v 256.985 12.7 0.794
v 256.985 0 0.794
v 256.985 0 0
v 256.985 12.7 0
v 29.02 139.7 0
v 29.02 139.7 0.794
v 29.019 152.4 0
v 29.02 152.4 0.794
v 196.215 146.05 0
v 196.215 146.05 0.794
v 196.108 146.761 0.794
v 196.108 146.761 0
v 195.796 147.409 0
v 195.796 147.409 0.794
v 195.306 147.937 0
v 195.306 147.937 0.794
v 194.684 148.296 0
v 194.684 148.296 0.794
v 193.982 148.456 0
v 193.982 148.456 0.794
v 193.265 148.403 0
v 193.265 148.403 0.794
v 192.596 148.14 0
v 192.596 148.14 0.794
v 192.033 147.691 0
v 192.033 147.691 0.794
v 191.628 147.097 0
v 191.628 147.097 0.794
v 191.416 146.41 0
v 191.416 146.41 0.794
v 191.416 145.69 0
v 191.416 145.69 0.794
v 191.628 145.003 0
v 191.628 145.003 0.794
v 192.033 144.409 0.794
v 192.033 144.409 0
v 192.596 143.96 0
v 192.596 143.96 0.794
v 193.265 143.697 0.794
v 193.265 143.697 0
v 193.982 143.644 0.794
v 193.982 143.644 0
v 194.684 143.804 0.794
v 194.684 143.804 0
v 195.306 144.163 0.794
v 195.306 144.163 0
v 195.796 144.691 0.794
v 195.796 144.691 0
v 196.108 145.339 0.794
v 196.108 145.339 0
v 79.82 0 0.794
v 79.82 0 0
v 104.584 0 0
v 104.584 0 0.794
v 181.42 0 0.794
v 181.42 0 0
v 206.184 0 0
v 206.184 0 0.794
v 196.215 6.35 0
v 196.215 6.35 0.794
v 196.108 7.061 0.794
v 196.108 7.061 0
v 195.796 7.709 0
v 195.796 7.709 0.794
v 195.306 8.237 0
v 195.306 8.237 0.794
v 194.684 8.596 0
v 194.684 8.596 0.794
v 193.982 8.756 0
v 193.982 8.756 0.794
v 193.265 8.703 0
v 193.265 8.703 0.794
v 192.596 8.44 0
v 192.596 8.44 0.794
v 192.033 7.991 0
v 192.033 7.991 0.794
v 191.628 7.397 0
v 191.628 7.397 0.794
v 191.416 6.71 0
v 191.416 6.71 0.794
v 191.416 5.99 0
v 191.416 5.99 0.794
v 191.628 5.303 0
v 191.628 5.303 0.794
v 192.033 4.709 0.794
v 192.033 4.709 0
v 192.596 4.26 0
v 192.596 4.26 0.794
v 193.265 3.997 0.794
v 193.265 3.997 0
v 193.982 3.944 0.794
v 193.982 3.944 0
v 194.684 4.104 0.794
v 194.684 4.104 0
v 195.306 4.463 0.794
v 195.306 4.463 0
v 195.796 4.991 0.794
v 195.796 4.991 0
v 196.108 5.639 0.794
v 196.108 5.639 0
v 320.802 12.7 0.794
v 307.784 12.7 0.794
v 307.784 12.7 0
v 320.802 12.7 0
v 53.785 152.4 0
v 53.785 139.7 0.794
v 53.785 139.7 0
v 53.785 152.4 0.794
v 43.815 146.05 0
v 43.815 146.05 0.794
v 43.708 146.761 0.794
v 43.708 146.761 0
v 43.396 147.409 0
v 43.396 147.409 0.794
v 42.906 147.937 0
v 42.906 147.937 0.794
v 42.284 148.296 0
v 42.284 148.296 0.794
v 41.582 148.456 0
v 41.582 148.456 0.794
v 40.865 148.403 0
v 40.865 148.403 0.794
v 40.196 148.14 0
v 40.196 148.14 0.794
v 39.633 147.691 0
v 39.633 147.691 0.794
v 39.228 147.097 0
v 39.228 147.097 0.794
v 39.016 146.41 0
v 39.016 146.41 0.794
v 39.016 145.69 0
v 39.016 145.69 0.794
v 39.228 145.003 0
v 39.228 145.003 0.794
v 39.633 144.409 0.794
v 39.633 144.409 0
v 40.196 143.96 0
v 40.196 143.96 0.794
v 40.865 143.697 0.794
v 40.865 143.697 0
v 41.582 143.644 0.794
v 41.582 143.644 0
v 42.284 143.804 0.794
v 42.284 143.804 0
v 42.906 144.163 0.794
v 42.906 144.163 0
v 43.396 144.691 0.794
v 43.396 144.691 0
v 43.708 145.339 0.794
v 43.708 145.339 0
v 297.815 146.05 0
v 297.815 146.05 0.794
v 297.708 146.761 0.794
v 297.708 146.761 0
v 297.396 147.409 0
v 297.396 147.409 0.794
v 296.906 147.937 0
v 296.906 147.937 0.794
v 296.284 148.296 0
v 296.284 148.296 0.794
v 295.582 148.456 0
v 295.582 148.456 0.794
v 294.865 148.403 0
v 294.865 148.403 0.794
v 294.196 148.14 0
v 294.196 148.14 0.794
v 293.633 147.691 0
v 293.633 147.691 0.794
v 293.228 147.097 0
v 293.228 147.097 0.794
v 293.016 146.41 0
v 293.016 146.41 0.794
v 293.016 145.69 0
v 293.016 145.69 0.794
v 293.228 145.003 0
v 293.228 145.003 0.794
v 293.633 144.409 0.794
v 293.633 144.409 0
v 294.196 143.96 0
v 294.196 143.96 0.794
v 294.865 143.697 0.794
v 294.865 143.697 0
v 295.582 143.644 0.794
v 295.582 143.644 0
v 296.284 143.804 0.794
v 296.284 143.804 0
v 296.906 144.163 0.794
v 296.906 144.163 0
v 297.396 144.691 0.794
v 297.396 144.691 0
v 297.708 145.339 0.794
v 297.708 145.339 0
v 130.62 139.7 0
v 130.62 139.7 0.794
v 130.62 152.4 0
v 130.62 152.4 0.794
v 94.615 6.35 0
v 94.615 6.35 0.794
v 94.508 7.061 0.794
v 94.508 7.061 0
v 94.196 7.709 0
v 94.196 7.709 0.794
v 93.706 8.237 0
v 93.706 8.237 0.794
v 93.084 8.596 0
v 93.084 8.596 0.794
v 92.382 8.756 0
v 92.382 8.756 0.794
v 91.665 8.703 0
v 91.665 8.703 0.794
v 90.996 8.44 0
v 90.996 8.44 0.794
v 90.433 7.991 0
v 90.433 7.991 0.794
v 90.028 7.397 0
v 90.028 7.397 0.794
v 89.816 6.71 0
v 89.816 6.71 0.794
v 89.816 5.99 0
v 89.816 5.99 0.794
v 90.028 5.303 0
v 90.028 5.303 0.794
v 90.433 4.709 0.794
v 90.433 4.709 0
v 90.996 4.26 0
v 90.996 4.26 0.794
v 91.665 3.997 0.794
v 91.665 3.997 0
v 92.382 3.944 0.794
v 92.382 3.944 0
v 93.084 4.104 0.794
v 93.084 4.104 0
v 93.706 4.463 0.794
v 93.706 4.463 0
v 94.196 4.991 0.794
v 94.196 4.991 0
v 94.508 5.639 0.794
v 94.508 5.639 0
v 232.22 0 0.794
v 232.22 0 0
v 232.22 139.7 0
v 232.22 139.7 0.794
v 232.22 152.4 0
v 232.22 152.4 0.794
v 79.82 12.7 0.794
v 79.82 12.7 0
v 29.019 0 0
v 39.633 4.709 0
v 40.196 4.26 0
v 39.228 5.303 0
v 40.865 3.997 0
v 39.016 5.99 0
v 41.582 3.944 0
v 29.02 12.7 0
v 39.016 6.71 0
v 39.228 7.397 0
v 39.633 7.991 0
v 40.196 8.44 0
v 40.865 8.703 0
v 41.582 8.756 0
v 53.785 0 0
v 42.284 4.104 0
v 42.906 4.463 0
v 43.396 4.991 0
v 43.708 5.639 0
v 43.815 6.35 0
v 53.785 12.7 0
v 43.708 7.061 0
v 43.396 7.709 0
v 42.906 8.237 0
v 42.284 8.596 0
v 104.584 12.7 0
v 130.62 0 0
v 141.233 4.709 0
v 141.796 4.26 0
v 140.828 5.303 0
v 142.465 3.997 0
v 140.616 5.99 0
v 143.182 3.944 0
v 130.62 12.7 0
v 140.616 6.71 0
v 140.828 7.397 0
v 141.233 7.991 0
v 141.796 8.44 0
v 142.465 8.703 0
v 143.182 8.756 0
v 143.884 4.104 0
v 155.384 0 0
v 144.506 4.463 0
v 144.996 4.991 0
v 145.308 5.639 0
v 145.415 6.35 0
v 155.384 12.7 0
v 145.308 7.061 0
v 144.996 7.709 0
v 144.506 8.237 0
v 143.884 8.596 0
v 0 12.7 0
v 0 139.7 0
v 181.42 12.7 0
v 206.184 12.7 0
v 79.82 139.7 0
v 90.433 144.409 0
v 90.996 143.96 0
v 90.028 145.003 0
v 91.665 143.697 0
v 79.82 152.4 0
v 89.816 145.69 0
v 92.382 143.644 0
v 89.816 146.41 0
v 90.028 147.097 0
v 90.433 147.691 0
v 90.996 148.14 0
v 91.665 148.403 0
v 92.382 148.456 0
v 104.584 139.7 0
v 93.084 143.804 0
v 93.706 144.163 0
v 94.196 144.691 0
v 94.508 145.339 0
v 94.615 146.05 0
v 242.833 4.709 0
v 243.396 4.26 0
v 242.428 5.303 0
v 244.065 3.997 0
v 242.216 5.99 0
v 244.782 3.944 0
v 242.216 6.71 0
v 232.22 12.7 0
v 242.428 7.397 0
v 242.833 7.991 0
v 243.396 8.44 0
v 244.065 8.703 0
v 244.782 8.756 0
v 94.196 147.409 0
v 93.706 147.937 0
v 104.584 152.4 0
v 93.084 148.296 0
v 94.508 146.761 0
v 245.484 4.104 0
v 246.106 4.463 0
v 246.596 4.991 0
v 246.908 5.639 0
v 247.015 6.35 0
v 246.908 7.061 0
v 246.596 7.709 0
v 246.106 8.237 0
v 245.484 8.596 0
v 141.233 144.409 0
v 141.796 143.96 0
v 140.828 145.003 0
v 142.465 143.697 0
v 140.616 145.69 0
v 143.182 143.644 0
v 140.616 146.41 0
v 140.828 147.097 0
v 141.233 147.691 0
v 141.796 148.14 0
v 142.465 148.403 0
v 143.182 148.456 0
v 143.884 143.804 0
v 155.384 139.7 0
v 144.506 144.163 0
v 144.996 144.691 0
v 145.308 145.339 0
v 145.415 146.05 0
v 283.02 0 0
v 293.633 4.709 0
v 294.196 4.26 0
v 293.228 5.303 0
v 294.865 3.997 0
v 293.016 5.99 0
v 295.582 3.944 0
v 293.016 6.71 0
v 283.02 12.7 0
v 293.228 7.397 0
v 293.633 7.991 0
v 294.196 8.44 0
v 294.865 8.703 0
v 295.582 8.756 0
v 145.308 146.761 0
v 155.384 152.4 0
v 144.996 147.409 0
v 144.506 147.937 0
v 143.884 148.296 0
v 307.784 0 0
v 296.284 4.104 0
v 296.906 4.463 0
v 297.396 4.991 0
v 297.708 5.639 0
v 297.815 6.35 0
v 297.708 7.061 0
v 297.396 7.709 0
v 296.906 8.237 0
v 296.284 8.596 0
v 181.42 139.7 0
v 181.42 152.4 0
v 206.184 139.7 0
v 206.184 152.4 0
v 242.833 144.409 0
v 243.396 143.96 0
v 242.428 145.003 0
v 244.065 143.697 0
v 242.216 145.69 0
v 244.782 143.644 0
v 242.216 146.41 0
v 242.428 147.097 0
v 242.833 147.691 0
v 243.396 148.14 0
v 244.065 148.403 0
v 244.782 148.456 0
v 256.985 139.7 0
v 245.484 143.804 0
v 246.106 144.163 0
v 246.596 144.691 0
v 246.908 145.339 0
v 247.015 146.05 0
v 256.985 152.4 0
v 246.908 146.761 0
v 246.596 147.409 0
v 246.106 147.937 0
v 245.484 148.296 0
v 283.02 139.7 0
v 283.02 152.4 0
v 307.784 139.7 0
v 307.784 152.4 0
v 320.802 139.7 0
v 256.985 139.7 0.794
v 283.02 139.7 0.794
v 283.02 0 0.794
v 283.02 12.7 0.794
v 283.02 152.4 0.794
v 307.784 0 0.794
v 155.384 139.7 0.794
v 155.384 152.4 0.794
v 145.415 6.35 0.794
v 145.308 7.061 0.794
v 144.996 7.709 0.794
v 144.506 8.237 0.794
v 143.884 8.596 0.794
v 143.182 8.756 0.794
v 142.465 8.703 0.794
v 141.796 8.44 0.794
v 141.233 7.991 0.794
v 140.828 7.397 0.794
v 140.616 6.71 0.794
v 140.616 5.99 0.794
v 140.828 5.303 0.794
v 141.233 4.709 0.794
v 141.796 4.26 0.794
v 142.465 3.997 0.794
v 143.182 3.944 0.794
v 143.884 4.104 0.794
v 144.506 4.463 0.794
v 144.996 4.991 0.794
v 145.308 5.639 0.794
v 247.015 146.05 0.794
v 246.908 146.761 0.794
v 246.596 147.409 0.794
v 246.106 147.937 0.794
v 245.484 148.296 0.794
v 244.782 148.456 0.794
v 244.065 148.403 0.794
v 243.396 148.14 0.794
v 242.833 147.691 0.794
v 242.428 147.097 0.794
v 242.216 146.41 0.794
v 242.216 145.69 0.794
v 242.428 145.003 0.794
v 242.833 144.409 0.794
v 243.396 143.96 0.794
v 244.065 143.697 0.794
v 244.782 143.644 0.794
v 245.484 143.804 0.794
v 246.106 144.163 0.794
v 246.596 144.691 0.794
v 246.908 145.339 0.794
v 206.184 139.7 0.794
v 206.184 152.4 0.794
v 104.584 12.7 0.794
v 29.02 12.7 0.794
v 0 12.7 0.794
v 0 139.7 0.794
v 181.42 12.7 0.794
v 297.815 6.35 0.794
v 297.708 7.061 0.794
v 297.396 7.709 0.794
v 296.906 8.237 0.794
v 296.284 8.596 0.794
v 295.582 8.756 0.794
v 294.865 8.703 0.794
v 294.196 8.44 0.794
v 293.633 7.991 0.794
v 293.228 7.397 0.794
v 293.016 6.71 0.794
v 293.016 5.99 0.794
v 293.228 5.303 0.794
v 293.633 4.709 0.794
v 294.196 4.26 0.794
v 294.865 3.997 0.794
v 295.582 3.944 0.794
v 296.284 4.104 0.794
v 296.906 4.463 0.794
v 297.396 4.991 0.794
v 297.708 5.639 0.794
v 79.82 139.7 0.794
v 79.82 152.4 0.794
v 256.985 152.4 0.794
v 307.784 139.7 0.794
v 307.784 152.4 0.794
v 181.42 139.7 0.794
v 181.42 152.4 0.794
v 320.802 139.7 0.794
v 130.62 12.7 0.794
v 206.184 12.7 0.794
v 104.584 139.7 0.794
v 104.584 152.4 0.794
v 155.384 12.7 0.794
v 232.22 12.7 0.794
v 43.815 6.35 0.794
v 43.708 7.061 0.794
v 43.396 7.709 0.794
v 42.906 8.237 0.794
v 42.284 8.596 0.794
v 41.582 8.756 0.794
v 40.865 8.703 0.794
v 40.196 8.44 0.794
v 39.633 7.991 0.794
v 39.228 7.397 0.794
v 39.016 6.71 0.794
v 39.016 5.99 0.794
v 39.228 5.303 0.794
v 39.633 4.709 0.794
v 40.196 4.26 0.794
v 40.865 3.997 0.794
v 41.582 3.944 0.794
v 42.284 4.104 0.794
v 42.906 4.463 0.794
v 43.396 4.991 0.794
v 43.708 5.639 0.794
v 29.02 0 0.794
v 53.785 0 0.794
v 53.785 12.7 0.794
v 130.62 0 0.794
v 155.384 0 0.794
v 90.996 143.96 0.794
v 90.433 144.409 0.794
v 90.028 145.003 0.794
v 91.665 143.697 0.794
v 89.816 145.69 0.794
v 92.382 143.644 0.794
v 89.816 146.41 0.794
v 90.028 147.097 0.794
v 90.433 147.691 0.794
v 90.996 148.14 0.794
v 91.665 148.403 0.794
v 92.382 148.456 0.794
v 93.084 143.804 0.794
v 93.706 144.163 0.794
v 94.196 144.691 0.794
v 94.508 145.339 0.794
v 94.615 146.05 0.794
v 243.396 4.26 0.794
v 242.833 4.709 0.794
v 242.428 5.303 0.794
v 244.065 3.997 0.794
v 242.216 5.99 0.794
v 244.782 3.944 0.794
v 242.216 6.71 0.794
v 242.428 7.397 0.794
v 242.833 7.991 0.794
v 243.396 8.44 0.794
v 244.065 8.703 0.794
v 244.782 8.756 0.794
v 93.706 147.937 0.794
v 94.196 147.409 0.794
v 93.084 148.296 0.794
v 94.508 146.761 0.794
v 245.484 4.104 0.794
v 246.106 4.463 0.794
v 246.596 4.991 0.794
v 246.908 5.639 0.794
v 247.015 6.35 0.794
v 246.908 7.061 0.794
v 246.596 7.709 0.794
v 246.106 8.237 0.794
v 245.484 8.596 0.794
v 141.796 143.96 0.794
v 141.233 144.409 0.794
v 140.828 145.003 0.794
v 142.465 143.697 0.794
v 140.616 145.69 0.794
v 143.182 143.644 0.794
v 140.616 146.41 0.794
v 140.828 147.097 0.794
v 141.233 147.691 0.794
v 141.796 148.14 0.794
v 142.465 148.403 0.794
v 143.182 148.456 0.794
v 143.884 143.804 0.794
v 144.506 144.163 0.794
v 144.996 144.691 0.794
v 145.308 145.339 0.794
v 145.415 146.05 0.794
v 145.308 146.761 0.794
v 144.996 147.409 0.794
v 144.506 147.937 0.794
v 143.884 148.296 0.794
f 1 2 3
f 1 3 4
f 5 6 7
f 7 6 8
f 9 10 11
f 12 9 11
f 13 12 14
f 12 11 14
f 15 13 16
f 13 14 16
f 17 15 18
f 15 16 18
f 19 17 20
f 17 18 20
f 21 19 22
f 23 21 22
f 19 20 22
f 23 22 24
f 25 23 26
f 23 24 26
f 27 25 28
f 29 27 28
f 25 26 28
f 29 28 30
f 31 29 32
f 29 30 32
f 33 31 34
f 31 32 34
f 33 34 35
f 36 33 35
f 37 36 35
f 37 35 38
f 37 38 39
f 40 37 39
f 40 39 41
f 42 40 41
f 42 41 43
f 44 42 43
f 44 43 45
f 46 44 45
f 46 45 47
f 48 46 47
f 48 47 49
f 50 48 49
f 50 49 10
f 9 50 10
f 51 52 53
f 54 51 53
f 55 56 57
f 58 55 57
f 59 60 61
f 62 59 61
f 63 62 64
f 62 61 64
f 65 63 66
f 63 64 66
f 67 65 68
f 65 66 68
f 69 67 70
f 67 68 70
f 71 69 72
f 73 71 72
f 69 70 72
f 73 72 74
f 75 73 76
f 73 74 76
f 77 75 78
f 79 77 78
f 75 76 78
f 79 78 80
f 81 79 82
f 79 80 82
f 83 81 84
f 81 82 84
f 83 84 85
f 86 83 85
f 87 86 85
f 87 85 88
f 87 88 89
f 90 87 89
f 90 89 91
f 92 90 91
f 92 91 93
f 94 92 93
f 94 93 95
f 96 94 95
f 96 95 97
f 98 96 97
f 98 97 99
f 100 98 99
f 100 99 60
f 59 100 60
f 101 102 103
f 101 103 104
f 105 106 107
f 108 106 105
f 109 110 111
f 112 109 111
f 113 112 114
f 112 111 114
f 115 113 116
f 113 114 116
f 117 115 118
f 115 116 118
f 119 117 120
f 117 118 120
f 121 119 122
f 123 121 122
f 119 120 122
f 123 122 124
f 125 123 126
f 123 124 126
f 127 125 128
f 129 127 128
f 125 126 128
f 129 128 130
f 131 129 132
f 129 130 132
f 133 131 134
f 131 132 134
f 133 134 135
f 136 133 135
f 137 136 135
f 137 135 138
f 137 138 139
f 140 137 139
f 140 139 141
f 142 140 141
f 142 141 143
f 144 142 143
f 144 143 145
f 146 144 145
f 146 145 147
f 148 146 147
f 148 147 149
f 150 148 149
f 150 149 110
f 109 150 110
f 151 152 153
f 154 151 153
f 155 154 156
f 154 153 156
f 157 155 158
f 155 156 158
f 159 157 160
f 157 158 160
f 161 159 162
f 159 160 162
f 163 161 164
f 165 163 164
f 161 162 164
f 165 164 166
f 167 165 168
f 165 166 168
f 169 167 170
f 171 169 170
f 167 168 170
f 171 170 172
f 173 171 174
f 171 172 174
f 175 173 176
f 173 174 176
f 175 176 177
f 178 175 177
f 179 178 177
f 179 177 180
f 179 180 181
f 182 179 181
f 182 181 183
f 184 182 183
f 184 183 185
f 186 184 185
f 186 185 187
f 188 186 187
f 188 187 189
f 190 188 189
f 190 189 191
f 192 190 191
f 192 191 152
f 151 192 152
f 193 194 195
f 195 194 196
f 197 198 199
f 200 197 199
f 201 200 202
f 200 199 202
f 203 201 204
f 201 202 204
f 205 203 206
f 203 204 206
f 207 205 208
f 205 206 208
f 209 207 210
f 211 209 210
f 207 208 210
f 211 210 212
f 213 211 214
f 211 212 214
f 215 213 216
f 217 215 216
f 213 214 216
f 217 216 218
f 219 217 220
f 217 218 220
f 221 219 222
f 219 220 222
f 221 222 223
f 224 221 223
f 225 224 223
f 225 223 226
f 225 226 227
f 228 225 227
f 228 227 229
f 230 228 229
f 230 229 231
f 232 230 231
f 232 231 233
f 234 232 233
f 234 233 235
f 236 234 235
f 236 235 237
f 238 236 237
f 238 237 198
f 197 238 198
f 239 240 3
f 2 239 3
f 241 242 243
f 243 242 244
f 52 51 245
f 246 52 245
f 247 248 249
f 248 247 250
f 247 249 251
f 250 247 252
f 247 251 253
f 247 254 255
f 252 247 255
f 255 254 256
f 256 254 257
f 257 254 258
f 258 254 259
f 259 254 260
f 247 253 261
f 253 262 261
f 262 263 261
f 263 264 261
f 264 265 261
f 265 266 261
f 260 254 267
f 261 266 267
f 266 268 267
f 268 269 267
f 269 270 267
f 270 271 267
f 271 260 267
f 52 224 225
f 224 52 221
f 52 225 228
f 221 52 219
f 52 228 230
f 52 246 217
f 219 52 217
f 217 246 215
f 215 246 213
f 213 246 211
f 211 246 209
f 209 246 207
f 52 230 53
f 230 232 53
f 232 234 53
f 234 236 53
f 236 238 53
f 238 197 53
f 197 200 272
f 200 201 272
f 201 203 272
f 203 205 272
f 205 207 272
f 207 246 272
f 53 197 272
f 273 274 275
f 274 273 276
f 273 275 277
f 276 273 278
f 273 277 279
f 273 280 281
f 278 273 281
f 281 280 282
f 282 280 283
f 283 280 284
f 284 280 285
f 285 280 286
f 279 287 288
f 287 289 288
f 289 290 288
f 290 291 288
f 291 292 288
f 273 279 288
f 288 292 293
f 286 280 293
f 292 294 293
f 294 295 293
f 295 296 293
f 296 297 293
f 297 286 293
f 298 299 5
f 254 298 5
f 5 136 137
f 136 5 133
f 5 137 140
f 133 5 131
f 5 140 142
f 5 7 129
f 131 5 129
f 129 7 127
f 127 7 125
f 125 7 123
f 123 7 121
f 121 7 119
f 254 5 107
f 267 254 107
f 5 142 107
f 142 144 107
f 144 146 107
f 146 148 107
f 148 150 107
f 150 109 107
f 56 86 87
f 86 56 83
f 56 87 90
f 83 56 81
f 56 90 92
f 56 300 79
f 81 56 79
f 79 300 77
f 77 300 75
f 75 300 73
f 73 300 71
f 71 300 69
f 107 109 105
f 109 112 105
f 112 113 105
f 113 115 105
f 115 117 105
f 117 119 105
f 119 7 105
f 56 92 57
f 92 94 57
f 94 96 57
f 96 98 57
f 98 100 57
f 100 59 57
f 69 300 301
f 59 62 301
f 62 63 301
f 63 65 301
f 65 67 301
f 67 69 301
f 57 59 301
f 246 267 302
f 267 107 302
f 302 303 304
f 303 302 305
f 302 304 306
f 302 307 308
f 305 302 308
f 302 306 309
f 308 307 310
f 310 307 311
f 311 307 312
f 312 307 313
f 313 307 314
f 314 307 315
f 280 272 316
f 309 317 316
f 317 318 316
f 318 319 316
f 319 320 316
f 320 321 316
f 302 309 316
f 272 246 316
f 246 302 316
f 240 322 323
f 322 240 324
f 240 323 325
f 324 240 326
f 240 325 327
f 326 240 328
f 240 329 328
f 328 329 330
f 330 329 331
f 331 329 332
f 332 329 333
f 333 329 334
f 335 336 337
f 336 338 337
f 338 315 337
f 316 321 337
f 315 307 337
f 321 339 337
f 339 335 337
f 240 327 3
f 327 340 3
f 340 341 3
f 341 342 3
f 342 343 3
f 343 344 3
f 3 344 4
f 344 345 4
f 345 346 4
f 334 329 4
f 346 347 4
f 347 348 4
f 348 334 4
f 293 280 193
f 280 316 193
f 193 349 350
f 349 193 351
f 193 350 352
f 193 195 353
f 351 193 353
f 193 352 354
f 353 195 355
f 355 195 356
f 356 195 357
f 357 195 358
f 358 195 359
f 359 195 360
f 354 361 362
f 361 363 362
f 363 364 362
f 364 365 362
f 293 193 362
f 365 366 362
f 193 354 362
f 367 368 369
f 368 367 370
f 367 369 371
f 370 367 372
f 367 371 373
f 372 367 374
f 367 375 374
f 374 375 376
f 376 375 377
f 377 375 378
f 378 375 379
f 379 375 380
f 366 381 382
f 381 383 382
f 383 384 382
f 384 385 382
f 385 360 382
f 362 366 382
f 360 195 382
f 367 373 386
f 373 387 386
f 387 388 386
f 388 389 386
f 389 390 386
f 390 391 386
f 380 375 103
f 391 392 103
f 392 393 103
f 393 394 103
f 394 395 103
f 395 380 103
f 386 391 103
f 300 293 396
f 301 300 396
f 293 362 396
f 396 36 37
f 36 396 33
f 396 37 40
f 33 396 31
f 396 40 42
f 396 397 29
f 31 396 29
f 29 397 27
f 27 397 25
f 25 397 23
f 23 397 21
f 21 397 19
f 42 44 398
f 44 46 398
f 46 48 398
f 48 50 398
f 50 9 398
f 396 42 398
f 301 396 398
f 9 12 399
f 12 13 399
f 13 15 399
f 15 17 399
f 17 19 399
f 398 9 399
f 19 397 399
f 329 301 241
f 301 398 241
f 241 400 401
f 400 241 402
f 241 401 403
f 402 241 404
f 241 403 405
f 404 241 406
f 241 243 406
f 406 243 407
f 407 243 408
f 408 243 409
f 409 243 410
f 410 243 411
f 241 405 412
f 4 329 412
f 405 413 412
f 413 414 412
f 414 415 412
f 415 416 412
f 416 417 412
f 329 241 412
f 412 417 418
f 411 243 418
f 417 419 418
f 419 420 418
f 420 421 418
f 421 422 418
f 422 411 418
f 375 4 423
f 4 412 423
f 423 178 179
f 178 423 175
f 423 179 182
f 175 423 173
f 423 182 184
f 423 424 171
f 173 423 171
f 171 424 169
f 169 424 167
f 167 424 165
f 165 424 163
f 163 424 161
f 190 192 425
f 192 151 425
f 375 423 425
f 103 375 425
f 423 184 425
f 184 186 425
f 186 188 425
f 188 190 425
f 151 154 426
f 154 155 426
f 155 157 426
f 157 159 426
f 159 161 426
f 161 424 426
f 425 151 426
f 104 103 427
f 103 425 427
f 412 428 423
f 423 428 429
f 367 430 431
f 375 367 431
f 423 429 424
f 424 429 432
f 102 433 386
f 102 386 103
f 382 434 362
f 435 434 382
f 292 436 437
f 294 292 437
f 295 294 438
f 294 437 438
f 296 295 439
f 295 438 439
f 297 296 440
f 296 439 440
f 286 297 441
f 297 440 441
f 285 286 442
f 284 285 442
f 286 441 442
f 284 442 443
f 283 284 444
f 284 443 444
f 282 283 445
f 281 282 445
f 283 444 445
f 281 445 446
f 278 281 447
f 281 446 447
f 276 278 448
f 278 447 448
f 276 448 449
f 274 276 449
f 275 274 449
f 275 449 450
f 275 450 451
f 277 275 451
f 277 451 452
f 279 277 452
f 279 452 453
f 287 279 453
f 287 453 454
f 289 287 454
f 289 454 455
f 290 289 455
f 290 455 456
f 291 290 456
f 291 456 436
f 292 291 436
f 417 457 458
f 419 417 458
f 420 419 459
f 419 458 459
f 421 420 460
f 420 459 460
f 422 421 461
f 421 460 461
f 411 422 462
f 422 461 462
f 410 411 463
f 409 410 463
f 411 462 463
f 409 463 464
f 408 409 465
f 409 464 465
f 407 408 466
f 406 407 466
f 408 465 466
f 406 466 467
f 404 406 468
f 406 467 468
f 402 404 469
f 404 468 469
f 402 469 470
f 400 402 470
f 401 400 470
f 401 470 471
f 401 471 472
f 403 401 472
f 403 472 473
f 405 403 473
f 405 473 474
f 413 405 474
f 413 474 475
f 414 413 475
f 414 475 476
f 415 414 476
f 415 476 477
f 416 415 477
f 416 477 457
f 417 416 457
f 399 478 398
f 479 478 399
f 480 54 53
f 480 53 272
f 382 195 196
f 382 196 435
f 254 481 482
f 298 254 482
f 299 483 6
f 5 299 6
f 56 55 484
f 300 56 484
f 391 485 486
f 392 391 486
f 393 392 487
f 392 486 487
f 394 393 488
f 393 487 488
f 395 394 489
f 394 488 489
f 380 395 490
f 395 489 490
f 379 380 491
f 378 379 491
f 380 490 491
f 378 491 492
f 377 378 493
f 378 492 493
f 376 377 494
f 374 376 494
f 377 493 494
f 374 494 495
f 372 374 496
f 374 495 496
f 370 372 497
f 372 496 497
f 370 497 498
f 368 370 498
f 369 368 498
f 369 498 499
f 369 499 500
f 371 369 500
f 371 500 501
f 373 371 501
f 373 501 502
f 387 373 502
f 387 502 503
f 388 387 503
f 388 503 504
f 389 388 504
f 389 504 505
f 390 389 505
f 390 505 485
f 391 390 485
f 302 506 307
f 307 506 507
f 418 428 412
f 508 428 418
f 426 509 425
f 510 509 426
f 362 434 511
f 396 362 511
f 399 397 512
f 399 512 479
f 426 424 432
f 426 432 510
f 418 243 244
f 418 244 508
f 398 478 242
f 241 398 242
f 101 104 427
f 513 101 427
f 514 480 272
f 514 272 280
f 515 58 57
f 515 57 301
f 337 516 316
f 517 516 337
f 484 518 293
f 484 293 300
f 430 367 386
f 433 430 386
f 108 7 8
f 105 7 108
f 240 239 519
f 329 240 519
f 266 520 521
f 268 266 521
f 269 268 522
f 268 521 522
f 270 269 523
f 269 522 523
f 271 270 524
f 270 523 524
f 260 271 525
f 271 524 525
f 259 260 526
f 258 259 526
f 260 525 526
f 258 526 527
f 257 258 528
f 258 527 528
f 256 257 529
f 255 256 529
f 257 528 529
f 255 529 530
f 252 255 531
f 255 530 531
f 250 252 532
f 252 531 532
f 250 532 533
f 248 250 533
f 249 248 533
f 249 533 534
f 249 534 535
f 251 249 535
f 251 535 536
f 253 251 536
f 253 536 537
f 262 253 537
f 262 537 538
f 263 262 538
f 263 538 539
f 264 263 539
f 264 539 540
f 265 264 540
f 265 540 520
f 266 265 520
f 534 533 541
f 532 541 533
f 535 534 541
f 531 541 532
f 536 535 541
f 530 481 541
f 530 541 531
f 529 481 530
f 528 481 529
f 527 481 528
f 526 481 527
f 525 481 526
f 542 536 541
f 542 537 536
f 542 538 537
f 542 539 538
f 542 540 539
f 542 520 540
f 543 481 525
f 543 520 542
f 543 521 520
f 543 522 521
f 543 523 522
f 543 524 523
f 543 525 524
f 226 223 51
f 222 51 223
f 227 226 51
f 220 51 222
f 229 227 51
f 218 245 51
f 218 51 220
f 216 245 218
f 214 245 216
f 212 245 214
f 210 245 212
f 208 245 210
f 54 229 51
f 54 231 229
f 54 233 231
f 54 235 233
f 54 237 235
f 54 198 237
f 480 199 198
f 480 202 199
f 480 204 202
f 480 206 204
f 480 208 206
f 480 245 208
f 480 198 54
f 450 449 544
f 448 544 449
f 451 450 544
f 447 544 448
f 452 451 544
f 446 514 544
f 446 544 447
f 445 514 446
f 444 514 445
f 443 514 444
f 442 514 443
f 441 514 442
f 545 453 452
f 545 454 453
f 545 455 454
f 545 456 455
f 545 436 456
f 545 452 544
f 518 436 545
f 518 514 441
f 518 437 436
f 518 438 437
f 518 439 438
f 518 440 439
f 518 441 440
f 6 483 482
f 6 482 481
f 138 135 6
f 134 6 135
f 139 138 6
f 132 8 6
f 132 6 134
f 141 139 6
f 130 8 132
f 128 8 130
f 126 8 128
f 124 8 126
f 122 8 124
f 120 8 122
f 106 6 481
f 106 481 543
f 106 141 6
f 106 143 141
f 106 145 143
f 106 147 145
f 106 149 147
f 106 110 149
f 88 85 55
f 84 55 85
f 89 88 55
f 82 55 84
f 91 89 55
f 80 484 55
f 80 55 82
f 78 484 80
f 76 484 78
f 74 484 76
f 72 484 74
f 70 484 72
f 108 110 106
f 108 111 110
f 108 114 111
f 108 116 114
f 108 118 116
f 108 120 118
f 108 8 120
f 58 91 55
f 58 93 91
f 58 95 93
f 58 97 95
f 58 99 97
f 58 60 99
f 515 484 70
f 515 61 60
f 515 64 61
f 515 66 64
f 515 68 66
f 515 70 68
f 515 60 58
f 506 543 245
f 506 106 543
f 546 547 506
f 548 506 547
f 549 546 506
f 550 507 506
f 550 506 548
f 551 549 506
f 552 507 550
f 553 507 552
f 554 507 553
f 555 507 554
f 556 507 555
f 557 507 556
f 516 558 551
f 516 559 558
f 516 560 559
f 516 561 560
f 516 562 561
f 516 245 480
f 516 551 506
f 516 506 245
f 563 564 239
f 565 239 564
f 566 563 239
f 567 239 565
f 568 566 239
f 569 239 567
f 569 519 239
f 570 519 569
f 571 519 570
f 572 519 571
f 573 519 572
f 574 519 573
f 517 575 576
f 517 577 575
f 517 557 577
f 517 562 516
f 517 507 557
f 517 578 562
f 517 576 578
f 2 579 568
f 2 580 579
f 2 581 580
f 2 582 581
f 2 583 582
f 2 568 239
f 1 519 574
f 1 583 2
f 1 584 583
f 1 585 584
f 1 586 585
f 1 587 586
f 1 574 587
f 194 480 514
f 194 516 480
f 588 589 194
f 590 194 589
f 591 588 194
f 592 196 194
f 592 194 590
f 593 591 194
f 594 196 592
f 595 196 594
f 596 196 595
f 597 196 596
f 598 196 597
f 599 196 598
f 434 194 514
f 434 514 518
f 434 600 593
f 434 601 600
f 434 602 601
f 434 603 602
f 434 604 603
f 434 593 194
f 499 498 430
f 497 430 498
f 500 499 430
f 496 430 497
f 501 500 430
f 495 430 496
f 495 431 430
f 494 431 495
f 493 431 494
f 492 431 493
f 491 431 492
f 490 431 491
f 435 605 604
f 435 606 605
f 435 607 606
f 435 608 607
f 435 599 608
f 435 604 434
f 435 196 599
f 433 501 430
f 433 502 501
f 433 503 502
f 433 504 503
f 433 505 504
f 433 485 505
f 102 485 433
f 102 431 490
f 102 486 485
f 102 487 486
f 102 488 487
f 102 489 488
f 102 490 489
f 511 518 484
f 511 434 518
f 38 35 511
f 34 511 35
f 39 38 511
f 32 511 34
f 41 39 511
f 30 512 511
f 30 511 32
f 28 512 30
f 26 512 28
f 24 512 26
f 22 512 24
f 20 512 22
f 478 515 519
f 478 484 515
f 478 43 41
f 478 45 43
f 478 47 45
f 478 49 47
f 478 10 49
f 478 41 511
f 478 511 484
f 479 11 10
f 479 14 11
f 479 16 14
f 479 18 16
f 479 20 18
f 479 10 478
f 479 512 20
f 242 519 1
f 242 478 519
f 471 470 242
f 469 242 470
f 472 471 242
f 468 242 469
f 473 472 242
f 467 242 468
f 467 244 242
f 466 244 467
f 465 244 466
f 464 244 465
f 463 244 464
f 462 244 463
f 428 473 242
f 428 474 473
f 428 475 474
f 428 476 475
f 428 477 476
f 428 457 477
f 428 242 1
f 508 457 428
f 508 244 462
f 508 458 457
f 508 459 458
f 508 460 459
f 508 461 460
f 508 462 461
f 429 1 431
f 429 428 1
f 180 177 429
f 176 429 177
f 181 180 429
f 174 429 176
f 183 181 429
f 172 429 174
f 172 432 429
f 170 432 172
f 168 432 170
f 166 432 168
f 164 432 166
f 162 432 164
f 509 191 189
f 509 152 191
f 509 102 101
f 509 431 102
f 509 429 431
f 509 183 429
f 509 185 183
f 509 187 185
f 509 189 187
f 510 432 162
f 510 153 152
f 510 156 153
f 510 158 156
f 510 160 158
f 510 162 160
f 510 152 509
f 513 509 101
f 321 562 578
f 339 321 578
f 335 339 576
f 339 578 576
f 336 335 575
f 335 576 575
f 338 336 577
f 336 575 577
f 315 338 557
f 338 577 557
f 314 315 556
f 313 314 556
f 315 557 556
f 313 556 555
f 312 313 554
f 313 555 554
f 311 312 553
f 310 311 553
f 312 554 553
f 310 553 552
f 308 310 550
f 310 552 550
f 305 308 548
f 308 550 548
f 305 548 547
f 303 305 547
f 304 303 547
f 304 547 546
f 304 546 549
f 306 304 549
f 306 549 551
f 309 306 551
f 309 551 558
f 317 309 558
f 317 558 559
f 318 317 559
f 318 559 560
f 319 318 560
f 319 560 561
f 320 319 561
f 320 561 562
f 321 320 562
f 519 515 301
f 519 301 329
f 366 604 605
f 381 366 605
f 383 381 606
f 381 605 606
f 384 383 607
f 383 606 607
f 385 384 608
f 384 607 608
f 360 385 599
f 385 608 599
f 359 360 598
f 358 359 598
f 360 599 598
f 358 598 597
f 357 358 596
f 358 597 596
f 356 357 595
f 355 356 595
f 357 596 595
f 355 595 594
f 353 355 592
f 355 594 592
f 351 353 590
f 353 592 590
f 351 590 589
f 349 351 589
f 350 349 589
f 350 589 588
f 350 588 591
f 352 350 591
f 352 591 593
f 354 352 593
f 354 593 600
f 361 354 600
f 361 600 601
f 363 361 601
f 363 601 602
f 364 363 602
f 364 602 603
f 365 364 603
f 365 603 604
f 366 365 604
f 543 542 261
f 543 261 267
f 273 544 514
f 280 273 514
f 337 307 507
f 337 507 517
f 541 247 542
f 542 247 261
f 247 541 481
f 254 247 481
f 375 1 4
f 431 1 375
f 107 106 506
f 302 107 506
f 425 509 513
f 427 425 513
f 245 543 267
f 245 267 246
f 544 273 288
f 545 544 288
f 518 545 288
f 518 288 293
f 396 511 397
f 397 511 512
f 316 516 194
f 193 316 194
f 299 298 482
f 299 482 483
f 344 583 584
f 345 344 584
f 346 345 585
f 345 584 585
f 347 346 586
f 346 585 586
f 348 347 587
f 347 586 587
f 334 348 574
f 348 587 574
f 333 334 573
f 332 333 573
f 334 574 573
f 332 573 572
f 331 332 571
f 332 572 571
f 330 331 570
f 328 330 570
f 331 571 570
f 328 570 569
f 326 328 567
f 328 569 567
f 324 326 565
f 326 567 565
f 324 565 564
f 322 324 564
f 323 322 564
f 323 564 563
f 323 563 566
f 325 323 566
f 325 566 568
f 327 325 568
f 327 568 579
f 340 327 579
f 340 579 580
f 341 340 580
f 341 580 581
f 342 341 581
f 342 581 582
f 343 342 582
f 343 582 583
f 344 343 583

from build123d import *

# Parameters (mm, degrees)
SKETCH1_W           = 320.802
SKETCH1_H           = 152.4
BOSS_EXTRUDE1_DEPTH = 0.79375
SKETCH2_W           = 13.0175
SKETCH2_H           = 12.7
SKETCH2_W_2         = 26.035
SKETCH2_W_3         = 2.9845
CUT_EXTRUDE1_DEPTH  = 1.79375
SKETCH3_R           = 2.413
CUT_EXTRUDE2_DEPTH  = 1.79375


with BuildPart() as part:
    # Sketch1 → Boss-Extrude1 (new body)
    with BuildSketch(Plane.XY):
        with Locations((160.401, 76.2)):
            Rectangle(SKETCH1_W, SKETCH1_H)
    extrude(amount=BOSS_EXTRUDE1_DEPTH)

    # Sketch2 → Cut-Extrude1 (cut, through all)
    with BuildSketch(Plane.XY.offset(0.79375)):
        with Locations((314.29325, 146.05)):
            Rectangle(SKETCH2_W, SKETCH2_H)
        with Locations((270.002, 146.05)):
            Rectangle(SKETCH2_W_2, SKETCH2_H)
        with Locations((219.202, 146.05)):
            Rectangle(SKETCH2_W_2, SKETCH2_H)
        with Locations((168.402, 146.05)):
            Rectangle(SKETCH2_W_2, SKETCH2_H)
        with Locations((117.602, 146.05)):
            Rectangle(SKETCH2_W_2, SKETCH2_H)
        with Locations((66.802, 146.05)):
            Rectangle(SKETCH2_W_2, SKETCH2_H)
        with Locations((16.002, 146.05)):
            Rectangle(SKETCH2_W_2, SKETCH2_H)
        with Locations((1.49225, 146.05)):
            Rectangle(SKETCH2_W_3, SKETCH2_H)
        with Locations((1.49225, 6.35)):
            Rectangle(SKETCH2_W_3, SKETCH2_H)
        with Locations((16.002, 6.35)):
            Rectangle(SKETCH2_W_2, SKETCH2_H)
        with Locations((66.802, 6.35)):
            Rectangle(SKETCH2_W_2, SKETCH2_H)
        with Locations((117.602, 6.35)):
            Rectangle(SKETCH2_W_2, SKETCH2_H)
        with Locations((168.402, 6.35)):
            Rectangle(SKETCH2_W_2, SKETCH2_H)
        with Locations((219.202, 6.35)):
            Rectangle(SKETCH2_W_2, SKETCH2_H)
        with Locations((270.002, 6.35)):
            Rectangle(SKETCH2_W_2, SKETCH2_H)
        with Locations((314.29325, 6.35)):
            Rectangle(SKETCH2_W, SKETCH2_H)
    extrude(amount=-CUT_EXTRUDE1_DEPTH, mode=Mode.SUBTRACT)

    # Sketch3 → Cut-Extrude2 (cut, through all)
    with BuildSketch(Plane.XY.offset(0.79375)):
        with Locations((41.402, 146.05)):
            Circle(SKETCH3_R)
        with Locations((92.202, 146.05)):
            Circle(SKETCH3_R)
        with Locations((143.002, 146.05)):
            Circle(SKETCH3_R)
        with Locations((193.802, 146.05)):
            Circle(SKETCH3_R)
        with Locations((244.602, 146.05)):
            Circle(SKETCH3_R)
        with Locations((295.402, 146.05)):
            Circle(SKETCH3_R)
        with Locations((92.202, 6.35)):
            Circle(SKETCH3_R)
        with Locations((143.002, 6.35)):
            Circle(SKETCH3_R)
        with Locations((193.802, 6.35)):
            Circle(SKETCH3_R)
        with Locations((244.602, 6.35)):
            Circle(SKETCH3_R)
        with Locations((295.402, 6.35)):
            Circle(SKETCH3_R)
        with Locations((41.402, 6.35)):
            Circle(SKETCH3_R)
    extrude(amount=-CUT_EXTRUDE2_DEPTH, mode=Mode.SUBTRACT)


solid = part.part
